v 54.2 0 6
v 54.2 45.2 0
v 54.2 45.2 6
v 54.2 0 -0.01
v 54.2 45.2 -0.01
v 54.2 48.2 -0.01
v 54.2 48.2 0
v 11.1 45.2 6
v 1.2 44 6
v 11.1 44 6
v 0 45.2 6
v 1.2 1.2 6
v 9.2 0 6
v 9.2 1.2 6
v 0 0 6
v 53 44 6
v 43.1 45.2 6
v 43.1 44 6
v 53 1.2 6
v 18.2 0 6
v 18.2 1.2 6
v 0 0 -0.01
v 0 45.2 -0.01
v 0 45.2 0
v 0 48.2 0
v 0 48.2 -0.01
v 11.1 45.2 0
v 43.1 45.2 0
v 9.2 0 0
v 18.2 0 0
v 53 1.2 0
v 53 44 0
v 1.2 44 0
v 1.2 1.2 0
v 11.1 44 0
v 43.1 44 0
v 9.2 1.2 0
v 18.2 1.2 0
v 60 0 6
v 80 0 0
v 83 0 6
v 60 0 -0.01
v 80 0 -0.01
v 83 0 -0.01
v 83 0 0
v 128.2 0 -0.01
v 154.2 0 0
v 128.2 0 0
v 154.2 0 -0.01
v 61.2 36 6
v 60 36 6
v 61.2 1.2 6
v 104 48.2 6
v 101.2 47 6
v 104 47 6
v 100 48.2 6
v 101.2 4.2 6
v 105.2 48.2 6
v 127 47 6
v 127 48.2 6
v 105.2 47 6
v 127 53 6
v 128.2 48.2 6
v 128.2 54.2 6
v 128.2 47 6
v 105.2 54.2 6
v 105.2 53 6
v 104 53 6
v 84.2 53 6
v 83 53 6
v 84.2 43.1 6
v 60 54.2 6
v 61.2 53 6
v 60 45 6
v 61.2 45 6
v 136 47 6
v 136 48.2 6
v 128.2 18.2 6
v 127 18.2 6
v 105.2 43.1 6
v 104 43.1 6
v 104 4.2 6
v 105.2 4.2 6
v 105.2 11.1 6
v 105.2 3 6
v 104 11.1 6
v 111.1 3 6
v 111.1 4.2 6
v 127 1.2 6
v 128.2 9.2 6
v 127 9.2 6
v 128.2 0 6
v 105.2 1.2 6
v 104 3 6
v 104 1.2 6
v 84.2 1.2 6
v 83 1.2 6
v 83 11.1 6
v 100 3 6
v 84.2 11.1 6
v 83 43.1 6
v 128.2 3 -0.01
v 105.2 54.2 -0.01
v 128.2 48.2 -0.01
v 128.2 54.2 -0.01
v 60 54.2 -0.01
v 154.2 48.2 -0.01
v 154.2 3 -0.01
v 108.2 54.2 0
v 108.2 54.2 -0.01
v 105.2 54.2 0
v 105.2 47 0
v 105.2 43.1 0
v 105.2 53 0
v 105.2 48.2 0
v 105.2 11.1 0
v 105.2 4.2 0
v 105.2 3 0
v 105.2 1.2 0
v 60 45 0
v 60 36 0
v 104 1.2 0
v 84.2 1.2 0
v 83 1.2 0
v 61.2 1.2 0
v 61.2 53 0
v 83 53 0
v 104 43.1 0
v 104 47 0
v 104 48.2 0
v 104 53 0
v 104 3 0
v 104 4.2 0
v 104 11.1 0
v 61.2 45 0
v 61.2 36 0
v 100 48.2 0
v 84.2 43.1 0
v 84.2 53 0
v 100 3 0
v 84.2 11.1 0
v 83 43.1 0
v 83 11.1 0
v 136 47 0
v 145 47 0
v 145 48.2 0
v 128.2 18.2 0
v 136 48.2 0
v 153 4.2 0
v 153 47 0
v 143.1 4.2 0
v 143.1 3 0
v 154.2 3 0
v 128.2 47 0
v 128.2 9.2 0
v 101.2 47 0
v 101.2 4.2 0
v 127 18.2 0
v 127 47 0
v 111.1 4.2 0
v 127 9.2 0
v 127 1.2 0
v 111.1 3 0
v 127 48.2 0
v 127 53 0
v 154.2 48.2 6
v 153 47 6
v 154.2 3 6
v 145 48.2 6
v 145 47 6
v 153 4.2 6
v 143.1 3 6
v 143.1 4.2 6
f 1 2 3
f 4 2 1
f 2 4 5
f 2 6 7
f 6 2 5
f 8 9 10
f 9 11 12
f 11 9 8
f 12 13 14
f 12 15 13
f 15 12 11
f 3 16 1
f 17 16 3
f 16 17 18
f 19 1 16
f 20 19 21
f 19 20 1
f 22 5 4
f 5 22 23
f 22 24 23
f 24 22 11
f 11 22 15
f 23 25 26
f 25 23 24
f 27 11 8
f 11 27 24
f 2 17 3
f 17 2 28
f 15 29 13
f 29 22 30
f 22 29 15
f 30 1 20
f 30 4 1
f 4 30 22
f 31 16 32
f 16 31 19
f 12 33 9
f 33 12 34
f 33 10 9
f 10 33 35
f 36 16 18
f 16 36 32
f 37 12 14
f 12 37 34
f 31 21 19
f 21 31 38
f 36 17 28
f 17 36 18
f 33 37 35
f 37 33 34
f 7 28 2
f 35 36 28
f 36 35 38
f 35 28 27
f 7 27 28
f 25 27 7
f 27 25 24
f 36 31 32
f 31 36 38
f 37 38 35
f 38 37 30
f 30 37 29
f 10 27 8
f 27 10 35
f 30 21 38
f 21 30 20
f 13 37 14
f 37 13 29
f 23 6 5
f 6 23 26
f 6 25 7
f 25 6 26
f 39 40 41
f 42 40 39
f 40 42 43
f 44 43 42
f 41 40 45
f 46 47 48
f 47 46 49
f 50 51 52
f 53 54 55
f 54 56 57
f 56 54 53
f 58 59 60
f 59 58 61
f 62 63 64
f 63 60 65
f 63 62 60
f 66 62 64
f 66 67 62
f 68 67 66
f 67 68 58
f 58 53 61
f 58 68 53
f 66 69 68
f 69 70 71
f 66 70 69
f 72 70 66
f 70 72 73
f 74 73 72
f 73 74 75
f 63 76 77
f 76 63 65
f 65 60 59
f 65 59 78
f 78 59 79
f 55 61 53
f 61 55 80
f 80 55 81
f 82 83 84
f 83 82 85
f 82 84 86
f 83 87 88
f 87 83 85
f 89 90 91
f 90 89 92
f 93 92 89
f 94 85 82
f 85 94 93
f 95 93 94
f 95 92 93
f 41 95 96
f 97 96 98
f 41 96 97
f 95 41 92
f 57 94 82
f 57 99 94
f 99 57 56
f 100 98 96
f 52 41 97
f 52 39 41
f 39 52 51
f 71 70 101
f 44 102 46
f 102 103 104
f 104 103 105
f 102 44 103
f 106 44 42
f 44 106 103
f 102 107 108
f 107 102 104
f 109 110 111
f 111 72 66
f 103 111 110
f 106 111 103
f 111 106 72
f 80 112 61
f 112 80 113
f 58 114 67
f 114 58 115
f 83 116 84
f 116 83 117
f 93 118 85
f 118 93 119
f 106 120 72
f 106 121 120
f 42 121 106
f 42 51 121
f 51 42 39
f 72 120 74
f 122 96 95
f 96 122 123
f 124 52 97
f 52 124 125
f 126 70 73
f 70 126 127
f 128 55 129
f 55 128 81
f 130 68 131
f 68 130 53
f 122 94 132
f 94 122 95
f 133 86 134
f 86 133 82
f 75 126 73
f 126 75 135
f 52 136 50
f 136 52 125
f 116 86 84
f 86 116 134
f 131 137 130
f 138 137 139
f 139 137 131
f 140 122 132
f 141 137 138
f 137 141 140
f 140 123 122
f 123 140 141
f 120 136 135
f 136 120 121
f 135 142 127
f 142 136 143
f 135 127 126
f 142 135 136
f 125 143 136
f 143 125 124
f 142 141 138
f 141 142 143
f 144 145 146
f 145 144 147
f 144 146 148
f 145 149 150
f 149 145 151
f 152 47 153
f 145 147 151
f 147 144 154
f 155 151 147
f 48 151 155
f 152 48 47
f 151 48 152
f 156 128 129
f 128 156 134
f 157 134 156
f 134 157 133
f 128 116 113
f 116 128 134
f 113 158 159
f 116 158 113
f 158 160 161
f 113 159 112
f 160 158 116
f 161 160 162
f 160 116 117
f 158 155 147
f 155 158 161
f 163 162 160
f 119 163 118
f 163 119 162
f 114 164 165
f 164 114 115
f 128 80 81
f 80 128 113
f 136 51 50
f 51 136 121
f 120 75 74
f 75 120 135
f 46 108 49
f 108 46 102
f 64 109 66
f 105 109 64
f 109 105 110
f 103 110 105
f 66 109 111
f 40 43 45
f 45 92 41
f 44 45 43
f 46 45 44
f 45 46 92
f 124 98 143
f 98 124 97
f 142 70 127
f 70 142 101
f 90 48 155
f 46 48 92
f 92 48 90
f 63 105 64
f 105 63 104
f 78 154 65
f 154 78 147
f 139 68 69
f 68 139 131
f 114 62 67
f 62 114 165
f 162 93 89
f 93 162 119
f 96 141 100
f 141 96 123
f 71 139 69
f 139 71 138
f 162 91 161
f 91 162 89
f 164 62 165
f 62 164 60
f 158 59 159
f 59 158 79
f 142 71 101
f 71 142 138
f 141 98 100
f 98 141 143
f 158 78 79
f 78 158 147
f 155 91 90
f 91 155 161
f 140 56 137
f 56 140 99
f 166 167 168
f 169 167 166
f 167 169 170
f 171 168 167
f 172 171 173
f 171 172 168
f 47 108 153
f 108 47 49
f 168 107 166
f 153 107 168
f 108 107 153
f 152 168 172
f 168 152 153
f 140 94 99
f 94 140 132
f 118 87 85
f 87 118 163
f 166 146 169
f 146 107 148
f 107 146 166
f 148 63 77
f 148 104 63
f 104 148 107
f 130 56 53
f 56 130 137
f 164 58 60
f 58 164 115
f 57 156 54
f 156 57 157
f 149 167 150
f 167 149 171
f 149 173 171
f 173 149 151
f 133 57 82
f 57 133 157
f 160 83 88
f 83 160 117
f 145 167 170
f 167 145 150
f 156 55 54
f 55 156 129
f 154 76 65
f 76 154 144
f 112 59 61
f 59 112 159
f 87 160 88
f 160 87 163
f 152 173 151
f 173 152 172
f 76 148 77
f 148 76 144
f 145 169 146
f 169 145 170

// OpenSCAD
// file: ../../Base/Boxes.scad
// Fischertechnik Box Foundation
// Pre-designed Boxes

use <Constants.scad>

include <PlacementOptions.scad>

box190Width = 190;
box190Depth = 130;
box130Width = 130;
box130Depth = 95;
boxUsageHeight = 33.9;
boxWallThickness = 2.4;
boxBaseThickness = 1.0;
boxWebWidth = 3.0;

// getBoxWallThickness()
// Gets the wall thickness of a Fischertechnik Box

function getBoxWallThickness() = boxWallThickness;

// Gets the usable height of a fischertechnik box
function getBoxUsageHeight() = boxUsageHeight;

// Gets the thickness of the Fischertechnik box base.
function getBoxBaseThickness() = boxBaseThickness;

// Gets the width of a box web
function getBoxWebWidth() = boxWebWidth;

// Gets the usable inner space of a Box 190 as an x/y-list
function getBox190Space() = [
    box190Width - 2*getBoxWallThickness(), 
    box190Depth - 2*getBoxWallThickness() ];

// Imports the Fischertechnik empty box 130x190 mm and places it at position 0,0
// 190x130 are the outer sizes, the inner space is slightly smaller. Use getBox190Space() to get the inner sizes.
// This module needs the STL file "Fischertechnik Box 130x190.stl" in the library path.
// The box is positioned that the usable inner space is at the 0,0,0 position. The

module Box190() {
    translate([-getBoxWallThickness(),-getBoxWallThickness(),-getBoxBaseThickness()])
        import("Fischertechnik Box 130x190.stl", convexity=3);
}

// Gets the usable inner space of a Box 130 as an x/y-list
function getBox130Space() = [
    box130Width - 2*getBoxWallThickness(), 
    box130Depth - 2*getBoxWallThickness() ];

// Imports the Fischertechnik empty box 95x130 mm and places it at position 0,0
// 190x130 are the outer sizes, the inner space is slightly smaller. Use getBox190Space() to get the inner sizes.
// This module needs the STL file "Fischertechnik Box 95x130.stl" in the library path.
// The box is positioned that the usable inner space is at the 0,0,0 position. The

module Box130() {
    translate([-getBoxWallThickness(),-getBoxWallThickness(),-getBoxBaseThickness()])
        import("Fischertechnik Box 95x130.stl", convexity=3);
}

// Creates a web at the specified box walls
// corner 0 = LowerLeft, 1 = UpperLeft, 2 = UpperRight, 3 = LowerRight
// side 0 = LeftOfCorner, 1 = RightOfCorner
// distance = Distance in mm from the corner
// box = inner width and depth of the box (default: Box 190)
// webWidth = length of the web (default is 3 mms)
// webThickness = thickness of the web (default is 1 mm)

module BoxWeb(corner, side, distance, box=getBox190Space(), webWidth=getBoxWebWidth(), webThickness=1.0) {
    sink = getBoxWallThickness()/2;

    width = (corner % 2 == 0) ? 
            (side == LeftOfCorner ? webWidth : webThickness) :
            (side == LeftOfCorner ? webThickness : webWidth);

    depth = (corner % 2 == 0) ? 
            (side == RightOfCorner ? webWidth : webThickness) :
            (side == RightOfCorner ? webThickness : webWidth);
    
    xDiff = corner == LowerLeft ? 
                (side == LeftOfCorner ? -sink : distance) :
            (corner == UpperLeft ?                
                (side == LeftOfCorner ? distance : -sink) :
            (corner == UpperRight ?
                (side == LeftOfCorner ? box.x-webWidth+sink : box.x-distance-webThickness) :
                (side == LeftOfCorner ? box.x-distance-webThickness: box.x-webWidth+sink)));

    yDiff = corner == LowerLeft ? 
                (side == RightOfCorner ? -sink : distance) :
            (corner == UpperLeft ?
                (side == RightOfCorner ? box.y-distance : box.y-webWidth+sink) :
            (corner == UpperRight ?
                (side == RightOfCorner ? box.y-webWidth+sink : box.y-distance) :
                (side == RightOfCorner ? distance : -sink)));
    
    translate([xDiff, yDiff, -getExcess()])
        cube([width, depth, boxUsageHeight + 2*getExcess()]);
}
// file: ../../Base/Rotation.scad
// Fischertechnik Box Foundation
// Geometry Helpers Rotation

include <PlacementOptions.scad>

// getRotatedSpace(space, rotation=NoRotation)
// Rotates the space dependent on the specified rotation

function getRotatedSpace(space, rotation=NoRotation) = [
    (rotation == Rotate90 || rotation == Rotate270) ? space.y : space.x,
    (rotation == Rotate90 || rotation == Rotate270) ? space.x : space.y
];

// Rotates the given space around the fixed left lower corner
// space = the space the children needs as width/depth list [width,depth]
// rotation = 0 Rotate0 degrees, 1 Rotate90 degrees, 2 Rotate180 degrees, 3 Rotate270 degrees (equivalent to -90)

module RotateFix(space, rotation=Rotate0) {
    dy = (rotation == Rotate0 || rotation == Rotate270) ? 0 :
        (rotation == Rotate90) ? space.x :
        space.y;
    dx = (rotation < Rotate180) ? 0 :
        (rotation == Rotate180) ? space.x :
        space.y;
    
    translate([dx, dy, 0])
        rotate([0, 0, rotations[rotation]])
            children();
}
// file: ../../Base/Alignment.scad
// Fischertechnik Box Foundation
// Geometry Helpers Alignment

include <PlacementOptions.scad>

// getAlignedX(elementWidth, spaceWidth, align=AlignRight, offset=0)
// Gets the aligned X offset of an element with the given
// width in the given space.
// elementWidth = The width of the element to positon
// spaceWidth = The space where the element should be aligned
// align = 0 AlignLeft, 1 AlignCenter, 2 AlignRight
// offset = an optional offset from the aligned position. When
// aligned left or centered, then positive values are in X direction.
// When aligned right then positive values are in negative X direction.

function getAlignedX(elementWidth, spaceWidth, align=AlignRight, offset=0) =
    (align == AlignLeft) ?
        offset :
        ((align == AlignCenter) ?
        (spaceWidth - elementWidth)/2 + offset :
        spaceWidth - offset - elementWidth);

// getAlignedY(elementDepth, spaceDepth, align=AlignTop, offset=0)
// Gets the aligned Y offset of an element with the given
// depth in the given space.
// elementDepth = The depth of the element to positon
// spaceDepth = The space where the element should be aligned
// align = 0 AlignBottom, 1 AlignCenter, 2 AlignTop
// offset = an optional offset from the aligned position. When
// aligned bottom or centered, then positive values are in Y direction.
// When aligned top then positive values are in negative Y direction.

function getAlignedY(elementDepth, spaceDepth, align=AlignTop, offset=0) =
    (align == AlignBottom) ?
        offset :
        ((align == AlignCenter) ?
        (spaceDepth - elementDepth)/2 + offset :
        spaceDepth - offset - elementDepth);
// file: ../../Base/Constants.scad
// Fischertechnik Box Foundation
// Constants

// Constant values necessary for multiple elements

// Base constants
dividerThickness = 1.2;
excess = 0.01;
fragments = 90;
tolerance = 0.8;

// Gets the thickness of a divider 
function getDividerThickness() = dividerThickness;

// Gets the excess that is used to merge walls into each other
function getExcess() = excess;

// Gets amount of fragments of a cylinder
function getFragments() = fragments;

// Gets the inner tolerance of a frame to each side
function getTolerance() = tolerance;


// Fischertechnik specific constants
axisDiameter = 4;
axisBottomDiameter = axisDiameter + 1;
standardEdgeDistance = 2.5;
standardWebDistance = 11.5;
standardCornerLength = 15;
tubeWallFactor = 1.6;

// Gets axis diameter
function getAxisDiameter() = axisDiameter;

// Gets axis bottom diameter for thicker part at the bottom
function getAxisBottomDiameter() = axisBottomDiameter;

// gets the standard distance to the wall of the box for dockable frames with webs
function getStandardEdgeDistance() = standardEdgeDistance;

// gets the standard distance of each web to the corner of the dockable frame
function getStandardWebDistance() = standardWebDistance;

// gets the standard length of the corner walls of a dockable frame
function getStandardCornerLength() = standardCornerLength;

// gets the wall thickness of a tube.
function getTubeWallThickness() = tubeWallFactor * getDividerThickness();
// file: ../../Base/PlacementOptions.scad
// Fischertechnik Box Foundation
// Placement Options

// Alignment
NoAlign = 0;
AlignLeft = 1;
AlignBottom = 2;
AlignCenter = 3;
AlignRight = 4;
AlignTop = 5;

// Element rotation degree steps
rotations = [0, -90, -180, -270];

// Rotation
NoRotation = 0;
Rotate0 = 0;
Rotate90 = 1;
Rotate180 = 2;
Rotate270 = 3;

// Docking (seen from above)
NoDock = -1;
DockLeft = 0;
DockTop = 1;
DockRight = 2;
DockCorner = 2;
DockBottom = 3;

// Web corners
LowerLeft = 0;
UpperLeft = 1;
UpperRight = 2;
LowerRight = 3;

// Web position relative to corner
LeftOfCorner = 0;
RightOfCorner = 1;
// file: ../../Elements/FrameMotor6V.scad
// Fischertechnik Box Library
// Frame for Motor 6V
// 31039

use <../Base/Constants.scad>
use <../Base/Placement.scad>
use <../ModelBase/Simple.scad>

include <../Base/PlacementOptions.scad>

width = 51;
depth = 42;
height = 6;

connectionDepth = 3;

// getFrameUniversalJointCardanSpace()
// Gets the complete space of the 6V motor frame

function getFrameMotor6VSpace() = getFrameOuterVolume([width, depth + connectionDepth, height]);

// FrameMotor6V()
// Frame for the 6V standard motor (as mot1)

module FrameMotor6V() {
    Space(getFrameMotor6VSpace());
    difference() {
        Frame([width, depth, height]);
    
        connectorCutoffWidth = 32;
        connectCutoffVolume = [connectorCutoffWidth, 6, height + 1];
        Place(
            boxSpace=getFrameMotor6VSpace(), 
            elementSpace=connectCutoffVolume,
            alignX=AlignCenter, alignY=AlignTop)
            cube(connectCutoffVolume);
        
        cableCutoffWidth = 9;
        cableCutoffOffset = 8;
        cableCutoffVolume = [cableCutoffWidth, 2*getDividerThickness(), height + 1];
        Place(
            x=cableCutoffOffset + getDividerThickness(),
            y = -getDividerThickness()/2,
            boxSpace=getFrameMotor6VSpace(), 
            elementSpace=cableCutoffVolume)
            cube(cableCutoffVolume);        
    }
}

// Test
color("lightgray")
FrameMotor6V();
// file: ../../Base/Placement.scad
// Fischertechnik Box Foundation
// Geometry Helpers Placement

use <Constants.scad>
use <Alignment.scad>
use <Rotation.scad>
use <Boxes.scad>

include <PlacementOptions.scad>

// Place(x=0, y=0, elementSpace=[0,0], alignX=AlignLeft, alignY=AlignBottom, rotation=Rotate0, boxSpace=getBox190Space())
// Places the child at the specified position
// y = Y-Position. This is a relative position when an X aligment is specified.
// x = X-Position. This is a relative position when an Y aligment is specified.
// elementSpace = space of the element to be placed [x,y]
// alignX = -1=NoAlign, 0 AlignLeft, 1 AlignCenter, 3 AlignRight (elementSpace and boxSpace required!)
// alignY = -1=NoAlign, 2 AlignBottom, 1 AlignCenter, 4 AlignTop (elementSpace and boxSpace required!)
// rotation = 0 Rotate0 0 degrees, 1 Rotate90 90 degrees, 
// 2 Rotate180 180 degrees, 3 Rotate270 270 degrees (equivalent to -90)
// boxSpace = Inner space of the box where the placement occurs [x,y] - default is Box 190x130 inner space

module Place(x=0, y=0, elementSpace=[0,0], 
  alignX=AlignLeft, alignY=AlignBottom, 
  rotation=NoRotation, boxSpace=getBox190Space()) {

    module Position(x, y, space, rotation=Rotate0) {
        translate([x, y, 0])
            RotateFix(space, rotation)
                children(0);
    }

    space = getRotatedSpace(elementSpace, rotation);
    alignedX = getAlignedX(space.x, boxSpace.x, alignX, x);
    alignedY = getAlignedY(space.y, boxSpace.y, alignY, y);
    Position(alignedX, alignedY, elementSpace, rotation)
        children();
}

// Center(space=getBox130Space(), elementSpace=[0,0])
// space = Space where the children is centered. For cylinder use centered=true and no elementSpace.
// elementSpace = space of the element to be centered [x,y]

module Center(space=getBox190Space(), elementSpace=[0,0]) {
    translate([(space.x - elementSpace.x) / 2, (space.y - elementSpace.y) / 2])
        children(0);
}

// CenterHorizontal(width=0, y=0, offset=0, space=getBox130Space())
// space = Space where the children is centered. For cylinder use centered=true and no elementSpace.
// elementSpace = space of the element to be centered [x,y]

module CenterHorizontal(width=0, y=0, offset=0, space=getBox190Space()) {
    translate([(space.x - width) / 2 + offset, y])
        children(0);
}

// CenterVertical(depth=0, x=0, offset=0, space=getBox130Space())
// space = Space where the children is centered. For cylinder use centered=true and no elementSpace.
// elementSpace = space of the element to be centered [x,y]

module CenterVertical(depth=0, x=0, offset=0, space=getBox190Space()) {
    translate([x, (space.y - depth) / 2 + offset])
        children(0);
}
// main file
// Fischertechnik Box Foundation
// Elements
// Test FrameMotor6V

use <../../Base/Placement.scad>
use <../../Elements/FrameMotor6V.scad>

include <../../Base/PlacementOptions.scad>

FrameMotor6V();

Place(60, 0, getFrameMotor6VSpace(), rotation=Rotate90)
    FrameMotor6V();

Place(80, 0, getFrameMotor6VSpace(), rotation=Rotate270)
    FrameMotor6V();

Place(100, 0, getFrameMotor6VSpace(), rotation=Rotate180)
    FrameMotor6V();
